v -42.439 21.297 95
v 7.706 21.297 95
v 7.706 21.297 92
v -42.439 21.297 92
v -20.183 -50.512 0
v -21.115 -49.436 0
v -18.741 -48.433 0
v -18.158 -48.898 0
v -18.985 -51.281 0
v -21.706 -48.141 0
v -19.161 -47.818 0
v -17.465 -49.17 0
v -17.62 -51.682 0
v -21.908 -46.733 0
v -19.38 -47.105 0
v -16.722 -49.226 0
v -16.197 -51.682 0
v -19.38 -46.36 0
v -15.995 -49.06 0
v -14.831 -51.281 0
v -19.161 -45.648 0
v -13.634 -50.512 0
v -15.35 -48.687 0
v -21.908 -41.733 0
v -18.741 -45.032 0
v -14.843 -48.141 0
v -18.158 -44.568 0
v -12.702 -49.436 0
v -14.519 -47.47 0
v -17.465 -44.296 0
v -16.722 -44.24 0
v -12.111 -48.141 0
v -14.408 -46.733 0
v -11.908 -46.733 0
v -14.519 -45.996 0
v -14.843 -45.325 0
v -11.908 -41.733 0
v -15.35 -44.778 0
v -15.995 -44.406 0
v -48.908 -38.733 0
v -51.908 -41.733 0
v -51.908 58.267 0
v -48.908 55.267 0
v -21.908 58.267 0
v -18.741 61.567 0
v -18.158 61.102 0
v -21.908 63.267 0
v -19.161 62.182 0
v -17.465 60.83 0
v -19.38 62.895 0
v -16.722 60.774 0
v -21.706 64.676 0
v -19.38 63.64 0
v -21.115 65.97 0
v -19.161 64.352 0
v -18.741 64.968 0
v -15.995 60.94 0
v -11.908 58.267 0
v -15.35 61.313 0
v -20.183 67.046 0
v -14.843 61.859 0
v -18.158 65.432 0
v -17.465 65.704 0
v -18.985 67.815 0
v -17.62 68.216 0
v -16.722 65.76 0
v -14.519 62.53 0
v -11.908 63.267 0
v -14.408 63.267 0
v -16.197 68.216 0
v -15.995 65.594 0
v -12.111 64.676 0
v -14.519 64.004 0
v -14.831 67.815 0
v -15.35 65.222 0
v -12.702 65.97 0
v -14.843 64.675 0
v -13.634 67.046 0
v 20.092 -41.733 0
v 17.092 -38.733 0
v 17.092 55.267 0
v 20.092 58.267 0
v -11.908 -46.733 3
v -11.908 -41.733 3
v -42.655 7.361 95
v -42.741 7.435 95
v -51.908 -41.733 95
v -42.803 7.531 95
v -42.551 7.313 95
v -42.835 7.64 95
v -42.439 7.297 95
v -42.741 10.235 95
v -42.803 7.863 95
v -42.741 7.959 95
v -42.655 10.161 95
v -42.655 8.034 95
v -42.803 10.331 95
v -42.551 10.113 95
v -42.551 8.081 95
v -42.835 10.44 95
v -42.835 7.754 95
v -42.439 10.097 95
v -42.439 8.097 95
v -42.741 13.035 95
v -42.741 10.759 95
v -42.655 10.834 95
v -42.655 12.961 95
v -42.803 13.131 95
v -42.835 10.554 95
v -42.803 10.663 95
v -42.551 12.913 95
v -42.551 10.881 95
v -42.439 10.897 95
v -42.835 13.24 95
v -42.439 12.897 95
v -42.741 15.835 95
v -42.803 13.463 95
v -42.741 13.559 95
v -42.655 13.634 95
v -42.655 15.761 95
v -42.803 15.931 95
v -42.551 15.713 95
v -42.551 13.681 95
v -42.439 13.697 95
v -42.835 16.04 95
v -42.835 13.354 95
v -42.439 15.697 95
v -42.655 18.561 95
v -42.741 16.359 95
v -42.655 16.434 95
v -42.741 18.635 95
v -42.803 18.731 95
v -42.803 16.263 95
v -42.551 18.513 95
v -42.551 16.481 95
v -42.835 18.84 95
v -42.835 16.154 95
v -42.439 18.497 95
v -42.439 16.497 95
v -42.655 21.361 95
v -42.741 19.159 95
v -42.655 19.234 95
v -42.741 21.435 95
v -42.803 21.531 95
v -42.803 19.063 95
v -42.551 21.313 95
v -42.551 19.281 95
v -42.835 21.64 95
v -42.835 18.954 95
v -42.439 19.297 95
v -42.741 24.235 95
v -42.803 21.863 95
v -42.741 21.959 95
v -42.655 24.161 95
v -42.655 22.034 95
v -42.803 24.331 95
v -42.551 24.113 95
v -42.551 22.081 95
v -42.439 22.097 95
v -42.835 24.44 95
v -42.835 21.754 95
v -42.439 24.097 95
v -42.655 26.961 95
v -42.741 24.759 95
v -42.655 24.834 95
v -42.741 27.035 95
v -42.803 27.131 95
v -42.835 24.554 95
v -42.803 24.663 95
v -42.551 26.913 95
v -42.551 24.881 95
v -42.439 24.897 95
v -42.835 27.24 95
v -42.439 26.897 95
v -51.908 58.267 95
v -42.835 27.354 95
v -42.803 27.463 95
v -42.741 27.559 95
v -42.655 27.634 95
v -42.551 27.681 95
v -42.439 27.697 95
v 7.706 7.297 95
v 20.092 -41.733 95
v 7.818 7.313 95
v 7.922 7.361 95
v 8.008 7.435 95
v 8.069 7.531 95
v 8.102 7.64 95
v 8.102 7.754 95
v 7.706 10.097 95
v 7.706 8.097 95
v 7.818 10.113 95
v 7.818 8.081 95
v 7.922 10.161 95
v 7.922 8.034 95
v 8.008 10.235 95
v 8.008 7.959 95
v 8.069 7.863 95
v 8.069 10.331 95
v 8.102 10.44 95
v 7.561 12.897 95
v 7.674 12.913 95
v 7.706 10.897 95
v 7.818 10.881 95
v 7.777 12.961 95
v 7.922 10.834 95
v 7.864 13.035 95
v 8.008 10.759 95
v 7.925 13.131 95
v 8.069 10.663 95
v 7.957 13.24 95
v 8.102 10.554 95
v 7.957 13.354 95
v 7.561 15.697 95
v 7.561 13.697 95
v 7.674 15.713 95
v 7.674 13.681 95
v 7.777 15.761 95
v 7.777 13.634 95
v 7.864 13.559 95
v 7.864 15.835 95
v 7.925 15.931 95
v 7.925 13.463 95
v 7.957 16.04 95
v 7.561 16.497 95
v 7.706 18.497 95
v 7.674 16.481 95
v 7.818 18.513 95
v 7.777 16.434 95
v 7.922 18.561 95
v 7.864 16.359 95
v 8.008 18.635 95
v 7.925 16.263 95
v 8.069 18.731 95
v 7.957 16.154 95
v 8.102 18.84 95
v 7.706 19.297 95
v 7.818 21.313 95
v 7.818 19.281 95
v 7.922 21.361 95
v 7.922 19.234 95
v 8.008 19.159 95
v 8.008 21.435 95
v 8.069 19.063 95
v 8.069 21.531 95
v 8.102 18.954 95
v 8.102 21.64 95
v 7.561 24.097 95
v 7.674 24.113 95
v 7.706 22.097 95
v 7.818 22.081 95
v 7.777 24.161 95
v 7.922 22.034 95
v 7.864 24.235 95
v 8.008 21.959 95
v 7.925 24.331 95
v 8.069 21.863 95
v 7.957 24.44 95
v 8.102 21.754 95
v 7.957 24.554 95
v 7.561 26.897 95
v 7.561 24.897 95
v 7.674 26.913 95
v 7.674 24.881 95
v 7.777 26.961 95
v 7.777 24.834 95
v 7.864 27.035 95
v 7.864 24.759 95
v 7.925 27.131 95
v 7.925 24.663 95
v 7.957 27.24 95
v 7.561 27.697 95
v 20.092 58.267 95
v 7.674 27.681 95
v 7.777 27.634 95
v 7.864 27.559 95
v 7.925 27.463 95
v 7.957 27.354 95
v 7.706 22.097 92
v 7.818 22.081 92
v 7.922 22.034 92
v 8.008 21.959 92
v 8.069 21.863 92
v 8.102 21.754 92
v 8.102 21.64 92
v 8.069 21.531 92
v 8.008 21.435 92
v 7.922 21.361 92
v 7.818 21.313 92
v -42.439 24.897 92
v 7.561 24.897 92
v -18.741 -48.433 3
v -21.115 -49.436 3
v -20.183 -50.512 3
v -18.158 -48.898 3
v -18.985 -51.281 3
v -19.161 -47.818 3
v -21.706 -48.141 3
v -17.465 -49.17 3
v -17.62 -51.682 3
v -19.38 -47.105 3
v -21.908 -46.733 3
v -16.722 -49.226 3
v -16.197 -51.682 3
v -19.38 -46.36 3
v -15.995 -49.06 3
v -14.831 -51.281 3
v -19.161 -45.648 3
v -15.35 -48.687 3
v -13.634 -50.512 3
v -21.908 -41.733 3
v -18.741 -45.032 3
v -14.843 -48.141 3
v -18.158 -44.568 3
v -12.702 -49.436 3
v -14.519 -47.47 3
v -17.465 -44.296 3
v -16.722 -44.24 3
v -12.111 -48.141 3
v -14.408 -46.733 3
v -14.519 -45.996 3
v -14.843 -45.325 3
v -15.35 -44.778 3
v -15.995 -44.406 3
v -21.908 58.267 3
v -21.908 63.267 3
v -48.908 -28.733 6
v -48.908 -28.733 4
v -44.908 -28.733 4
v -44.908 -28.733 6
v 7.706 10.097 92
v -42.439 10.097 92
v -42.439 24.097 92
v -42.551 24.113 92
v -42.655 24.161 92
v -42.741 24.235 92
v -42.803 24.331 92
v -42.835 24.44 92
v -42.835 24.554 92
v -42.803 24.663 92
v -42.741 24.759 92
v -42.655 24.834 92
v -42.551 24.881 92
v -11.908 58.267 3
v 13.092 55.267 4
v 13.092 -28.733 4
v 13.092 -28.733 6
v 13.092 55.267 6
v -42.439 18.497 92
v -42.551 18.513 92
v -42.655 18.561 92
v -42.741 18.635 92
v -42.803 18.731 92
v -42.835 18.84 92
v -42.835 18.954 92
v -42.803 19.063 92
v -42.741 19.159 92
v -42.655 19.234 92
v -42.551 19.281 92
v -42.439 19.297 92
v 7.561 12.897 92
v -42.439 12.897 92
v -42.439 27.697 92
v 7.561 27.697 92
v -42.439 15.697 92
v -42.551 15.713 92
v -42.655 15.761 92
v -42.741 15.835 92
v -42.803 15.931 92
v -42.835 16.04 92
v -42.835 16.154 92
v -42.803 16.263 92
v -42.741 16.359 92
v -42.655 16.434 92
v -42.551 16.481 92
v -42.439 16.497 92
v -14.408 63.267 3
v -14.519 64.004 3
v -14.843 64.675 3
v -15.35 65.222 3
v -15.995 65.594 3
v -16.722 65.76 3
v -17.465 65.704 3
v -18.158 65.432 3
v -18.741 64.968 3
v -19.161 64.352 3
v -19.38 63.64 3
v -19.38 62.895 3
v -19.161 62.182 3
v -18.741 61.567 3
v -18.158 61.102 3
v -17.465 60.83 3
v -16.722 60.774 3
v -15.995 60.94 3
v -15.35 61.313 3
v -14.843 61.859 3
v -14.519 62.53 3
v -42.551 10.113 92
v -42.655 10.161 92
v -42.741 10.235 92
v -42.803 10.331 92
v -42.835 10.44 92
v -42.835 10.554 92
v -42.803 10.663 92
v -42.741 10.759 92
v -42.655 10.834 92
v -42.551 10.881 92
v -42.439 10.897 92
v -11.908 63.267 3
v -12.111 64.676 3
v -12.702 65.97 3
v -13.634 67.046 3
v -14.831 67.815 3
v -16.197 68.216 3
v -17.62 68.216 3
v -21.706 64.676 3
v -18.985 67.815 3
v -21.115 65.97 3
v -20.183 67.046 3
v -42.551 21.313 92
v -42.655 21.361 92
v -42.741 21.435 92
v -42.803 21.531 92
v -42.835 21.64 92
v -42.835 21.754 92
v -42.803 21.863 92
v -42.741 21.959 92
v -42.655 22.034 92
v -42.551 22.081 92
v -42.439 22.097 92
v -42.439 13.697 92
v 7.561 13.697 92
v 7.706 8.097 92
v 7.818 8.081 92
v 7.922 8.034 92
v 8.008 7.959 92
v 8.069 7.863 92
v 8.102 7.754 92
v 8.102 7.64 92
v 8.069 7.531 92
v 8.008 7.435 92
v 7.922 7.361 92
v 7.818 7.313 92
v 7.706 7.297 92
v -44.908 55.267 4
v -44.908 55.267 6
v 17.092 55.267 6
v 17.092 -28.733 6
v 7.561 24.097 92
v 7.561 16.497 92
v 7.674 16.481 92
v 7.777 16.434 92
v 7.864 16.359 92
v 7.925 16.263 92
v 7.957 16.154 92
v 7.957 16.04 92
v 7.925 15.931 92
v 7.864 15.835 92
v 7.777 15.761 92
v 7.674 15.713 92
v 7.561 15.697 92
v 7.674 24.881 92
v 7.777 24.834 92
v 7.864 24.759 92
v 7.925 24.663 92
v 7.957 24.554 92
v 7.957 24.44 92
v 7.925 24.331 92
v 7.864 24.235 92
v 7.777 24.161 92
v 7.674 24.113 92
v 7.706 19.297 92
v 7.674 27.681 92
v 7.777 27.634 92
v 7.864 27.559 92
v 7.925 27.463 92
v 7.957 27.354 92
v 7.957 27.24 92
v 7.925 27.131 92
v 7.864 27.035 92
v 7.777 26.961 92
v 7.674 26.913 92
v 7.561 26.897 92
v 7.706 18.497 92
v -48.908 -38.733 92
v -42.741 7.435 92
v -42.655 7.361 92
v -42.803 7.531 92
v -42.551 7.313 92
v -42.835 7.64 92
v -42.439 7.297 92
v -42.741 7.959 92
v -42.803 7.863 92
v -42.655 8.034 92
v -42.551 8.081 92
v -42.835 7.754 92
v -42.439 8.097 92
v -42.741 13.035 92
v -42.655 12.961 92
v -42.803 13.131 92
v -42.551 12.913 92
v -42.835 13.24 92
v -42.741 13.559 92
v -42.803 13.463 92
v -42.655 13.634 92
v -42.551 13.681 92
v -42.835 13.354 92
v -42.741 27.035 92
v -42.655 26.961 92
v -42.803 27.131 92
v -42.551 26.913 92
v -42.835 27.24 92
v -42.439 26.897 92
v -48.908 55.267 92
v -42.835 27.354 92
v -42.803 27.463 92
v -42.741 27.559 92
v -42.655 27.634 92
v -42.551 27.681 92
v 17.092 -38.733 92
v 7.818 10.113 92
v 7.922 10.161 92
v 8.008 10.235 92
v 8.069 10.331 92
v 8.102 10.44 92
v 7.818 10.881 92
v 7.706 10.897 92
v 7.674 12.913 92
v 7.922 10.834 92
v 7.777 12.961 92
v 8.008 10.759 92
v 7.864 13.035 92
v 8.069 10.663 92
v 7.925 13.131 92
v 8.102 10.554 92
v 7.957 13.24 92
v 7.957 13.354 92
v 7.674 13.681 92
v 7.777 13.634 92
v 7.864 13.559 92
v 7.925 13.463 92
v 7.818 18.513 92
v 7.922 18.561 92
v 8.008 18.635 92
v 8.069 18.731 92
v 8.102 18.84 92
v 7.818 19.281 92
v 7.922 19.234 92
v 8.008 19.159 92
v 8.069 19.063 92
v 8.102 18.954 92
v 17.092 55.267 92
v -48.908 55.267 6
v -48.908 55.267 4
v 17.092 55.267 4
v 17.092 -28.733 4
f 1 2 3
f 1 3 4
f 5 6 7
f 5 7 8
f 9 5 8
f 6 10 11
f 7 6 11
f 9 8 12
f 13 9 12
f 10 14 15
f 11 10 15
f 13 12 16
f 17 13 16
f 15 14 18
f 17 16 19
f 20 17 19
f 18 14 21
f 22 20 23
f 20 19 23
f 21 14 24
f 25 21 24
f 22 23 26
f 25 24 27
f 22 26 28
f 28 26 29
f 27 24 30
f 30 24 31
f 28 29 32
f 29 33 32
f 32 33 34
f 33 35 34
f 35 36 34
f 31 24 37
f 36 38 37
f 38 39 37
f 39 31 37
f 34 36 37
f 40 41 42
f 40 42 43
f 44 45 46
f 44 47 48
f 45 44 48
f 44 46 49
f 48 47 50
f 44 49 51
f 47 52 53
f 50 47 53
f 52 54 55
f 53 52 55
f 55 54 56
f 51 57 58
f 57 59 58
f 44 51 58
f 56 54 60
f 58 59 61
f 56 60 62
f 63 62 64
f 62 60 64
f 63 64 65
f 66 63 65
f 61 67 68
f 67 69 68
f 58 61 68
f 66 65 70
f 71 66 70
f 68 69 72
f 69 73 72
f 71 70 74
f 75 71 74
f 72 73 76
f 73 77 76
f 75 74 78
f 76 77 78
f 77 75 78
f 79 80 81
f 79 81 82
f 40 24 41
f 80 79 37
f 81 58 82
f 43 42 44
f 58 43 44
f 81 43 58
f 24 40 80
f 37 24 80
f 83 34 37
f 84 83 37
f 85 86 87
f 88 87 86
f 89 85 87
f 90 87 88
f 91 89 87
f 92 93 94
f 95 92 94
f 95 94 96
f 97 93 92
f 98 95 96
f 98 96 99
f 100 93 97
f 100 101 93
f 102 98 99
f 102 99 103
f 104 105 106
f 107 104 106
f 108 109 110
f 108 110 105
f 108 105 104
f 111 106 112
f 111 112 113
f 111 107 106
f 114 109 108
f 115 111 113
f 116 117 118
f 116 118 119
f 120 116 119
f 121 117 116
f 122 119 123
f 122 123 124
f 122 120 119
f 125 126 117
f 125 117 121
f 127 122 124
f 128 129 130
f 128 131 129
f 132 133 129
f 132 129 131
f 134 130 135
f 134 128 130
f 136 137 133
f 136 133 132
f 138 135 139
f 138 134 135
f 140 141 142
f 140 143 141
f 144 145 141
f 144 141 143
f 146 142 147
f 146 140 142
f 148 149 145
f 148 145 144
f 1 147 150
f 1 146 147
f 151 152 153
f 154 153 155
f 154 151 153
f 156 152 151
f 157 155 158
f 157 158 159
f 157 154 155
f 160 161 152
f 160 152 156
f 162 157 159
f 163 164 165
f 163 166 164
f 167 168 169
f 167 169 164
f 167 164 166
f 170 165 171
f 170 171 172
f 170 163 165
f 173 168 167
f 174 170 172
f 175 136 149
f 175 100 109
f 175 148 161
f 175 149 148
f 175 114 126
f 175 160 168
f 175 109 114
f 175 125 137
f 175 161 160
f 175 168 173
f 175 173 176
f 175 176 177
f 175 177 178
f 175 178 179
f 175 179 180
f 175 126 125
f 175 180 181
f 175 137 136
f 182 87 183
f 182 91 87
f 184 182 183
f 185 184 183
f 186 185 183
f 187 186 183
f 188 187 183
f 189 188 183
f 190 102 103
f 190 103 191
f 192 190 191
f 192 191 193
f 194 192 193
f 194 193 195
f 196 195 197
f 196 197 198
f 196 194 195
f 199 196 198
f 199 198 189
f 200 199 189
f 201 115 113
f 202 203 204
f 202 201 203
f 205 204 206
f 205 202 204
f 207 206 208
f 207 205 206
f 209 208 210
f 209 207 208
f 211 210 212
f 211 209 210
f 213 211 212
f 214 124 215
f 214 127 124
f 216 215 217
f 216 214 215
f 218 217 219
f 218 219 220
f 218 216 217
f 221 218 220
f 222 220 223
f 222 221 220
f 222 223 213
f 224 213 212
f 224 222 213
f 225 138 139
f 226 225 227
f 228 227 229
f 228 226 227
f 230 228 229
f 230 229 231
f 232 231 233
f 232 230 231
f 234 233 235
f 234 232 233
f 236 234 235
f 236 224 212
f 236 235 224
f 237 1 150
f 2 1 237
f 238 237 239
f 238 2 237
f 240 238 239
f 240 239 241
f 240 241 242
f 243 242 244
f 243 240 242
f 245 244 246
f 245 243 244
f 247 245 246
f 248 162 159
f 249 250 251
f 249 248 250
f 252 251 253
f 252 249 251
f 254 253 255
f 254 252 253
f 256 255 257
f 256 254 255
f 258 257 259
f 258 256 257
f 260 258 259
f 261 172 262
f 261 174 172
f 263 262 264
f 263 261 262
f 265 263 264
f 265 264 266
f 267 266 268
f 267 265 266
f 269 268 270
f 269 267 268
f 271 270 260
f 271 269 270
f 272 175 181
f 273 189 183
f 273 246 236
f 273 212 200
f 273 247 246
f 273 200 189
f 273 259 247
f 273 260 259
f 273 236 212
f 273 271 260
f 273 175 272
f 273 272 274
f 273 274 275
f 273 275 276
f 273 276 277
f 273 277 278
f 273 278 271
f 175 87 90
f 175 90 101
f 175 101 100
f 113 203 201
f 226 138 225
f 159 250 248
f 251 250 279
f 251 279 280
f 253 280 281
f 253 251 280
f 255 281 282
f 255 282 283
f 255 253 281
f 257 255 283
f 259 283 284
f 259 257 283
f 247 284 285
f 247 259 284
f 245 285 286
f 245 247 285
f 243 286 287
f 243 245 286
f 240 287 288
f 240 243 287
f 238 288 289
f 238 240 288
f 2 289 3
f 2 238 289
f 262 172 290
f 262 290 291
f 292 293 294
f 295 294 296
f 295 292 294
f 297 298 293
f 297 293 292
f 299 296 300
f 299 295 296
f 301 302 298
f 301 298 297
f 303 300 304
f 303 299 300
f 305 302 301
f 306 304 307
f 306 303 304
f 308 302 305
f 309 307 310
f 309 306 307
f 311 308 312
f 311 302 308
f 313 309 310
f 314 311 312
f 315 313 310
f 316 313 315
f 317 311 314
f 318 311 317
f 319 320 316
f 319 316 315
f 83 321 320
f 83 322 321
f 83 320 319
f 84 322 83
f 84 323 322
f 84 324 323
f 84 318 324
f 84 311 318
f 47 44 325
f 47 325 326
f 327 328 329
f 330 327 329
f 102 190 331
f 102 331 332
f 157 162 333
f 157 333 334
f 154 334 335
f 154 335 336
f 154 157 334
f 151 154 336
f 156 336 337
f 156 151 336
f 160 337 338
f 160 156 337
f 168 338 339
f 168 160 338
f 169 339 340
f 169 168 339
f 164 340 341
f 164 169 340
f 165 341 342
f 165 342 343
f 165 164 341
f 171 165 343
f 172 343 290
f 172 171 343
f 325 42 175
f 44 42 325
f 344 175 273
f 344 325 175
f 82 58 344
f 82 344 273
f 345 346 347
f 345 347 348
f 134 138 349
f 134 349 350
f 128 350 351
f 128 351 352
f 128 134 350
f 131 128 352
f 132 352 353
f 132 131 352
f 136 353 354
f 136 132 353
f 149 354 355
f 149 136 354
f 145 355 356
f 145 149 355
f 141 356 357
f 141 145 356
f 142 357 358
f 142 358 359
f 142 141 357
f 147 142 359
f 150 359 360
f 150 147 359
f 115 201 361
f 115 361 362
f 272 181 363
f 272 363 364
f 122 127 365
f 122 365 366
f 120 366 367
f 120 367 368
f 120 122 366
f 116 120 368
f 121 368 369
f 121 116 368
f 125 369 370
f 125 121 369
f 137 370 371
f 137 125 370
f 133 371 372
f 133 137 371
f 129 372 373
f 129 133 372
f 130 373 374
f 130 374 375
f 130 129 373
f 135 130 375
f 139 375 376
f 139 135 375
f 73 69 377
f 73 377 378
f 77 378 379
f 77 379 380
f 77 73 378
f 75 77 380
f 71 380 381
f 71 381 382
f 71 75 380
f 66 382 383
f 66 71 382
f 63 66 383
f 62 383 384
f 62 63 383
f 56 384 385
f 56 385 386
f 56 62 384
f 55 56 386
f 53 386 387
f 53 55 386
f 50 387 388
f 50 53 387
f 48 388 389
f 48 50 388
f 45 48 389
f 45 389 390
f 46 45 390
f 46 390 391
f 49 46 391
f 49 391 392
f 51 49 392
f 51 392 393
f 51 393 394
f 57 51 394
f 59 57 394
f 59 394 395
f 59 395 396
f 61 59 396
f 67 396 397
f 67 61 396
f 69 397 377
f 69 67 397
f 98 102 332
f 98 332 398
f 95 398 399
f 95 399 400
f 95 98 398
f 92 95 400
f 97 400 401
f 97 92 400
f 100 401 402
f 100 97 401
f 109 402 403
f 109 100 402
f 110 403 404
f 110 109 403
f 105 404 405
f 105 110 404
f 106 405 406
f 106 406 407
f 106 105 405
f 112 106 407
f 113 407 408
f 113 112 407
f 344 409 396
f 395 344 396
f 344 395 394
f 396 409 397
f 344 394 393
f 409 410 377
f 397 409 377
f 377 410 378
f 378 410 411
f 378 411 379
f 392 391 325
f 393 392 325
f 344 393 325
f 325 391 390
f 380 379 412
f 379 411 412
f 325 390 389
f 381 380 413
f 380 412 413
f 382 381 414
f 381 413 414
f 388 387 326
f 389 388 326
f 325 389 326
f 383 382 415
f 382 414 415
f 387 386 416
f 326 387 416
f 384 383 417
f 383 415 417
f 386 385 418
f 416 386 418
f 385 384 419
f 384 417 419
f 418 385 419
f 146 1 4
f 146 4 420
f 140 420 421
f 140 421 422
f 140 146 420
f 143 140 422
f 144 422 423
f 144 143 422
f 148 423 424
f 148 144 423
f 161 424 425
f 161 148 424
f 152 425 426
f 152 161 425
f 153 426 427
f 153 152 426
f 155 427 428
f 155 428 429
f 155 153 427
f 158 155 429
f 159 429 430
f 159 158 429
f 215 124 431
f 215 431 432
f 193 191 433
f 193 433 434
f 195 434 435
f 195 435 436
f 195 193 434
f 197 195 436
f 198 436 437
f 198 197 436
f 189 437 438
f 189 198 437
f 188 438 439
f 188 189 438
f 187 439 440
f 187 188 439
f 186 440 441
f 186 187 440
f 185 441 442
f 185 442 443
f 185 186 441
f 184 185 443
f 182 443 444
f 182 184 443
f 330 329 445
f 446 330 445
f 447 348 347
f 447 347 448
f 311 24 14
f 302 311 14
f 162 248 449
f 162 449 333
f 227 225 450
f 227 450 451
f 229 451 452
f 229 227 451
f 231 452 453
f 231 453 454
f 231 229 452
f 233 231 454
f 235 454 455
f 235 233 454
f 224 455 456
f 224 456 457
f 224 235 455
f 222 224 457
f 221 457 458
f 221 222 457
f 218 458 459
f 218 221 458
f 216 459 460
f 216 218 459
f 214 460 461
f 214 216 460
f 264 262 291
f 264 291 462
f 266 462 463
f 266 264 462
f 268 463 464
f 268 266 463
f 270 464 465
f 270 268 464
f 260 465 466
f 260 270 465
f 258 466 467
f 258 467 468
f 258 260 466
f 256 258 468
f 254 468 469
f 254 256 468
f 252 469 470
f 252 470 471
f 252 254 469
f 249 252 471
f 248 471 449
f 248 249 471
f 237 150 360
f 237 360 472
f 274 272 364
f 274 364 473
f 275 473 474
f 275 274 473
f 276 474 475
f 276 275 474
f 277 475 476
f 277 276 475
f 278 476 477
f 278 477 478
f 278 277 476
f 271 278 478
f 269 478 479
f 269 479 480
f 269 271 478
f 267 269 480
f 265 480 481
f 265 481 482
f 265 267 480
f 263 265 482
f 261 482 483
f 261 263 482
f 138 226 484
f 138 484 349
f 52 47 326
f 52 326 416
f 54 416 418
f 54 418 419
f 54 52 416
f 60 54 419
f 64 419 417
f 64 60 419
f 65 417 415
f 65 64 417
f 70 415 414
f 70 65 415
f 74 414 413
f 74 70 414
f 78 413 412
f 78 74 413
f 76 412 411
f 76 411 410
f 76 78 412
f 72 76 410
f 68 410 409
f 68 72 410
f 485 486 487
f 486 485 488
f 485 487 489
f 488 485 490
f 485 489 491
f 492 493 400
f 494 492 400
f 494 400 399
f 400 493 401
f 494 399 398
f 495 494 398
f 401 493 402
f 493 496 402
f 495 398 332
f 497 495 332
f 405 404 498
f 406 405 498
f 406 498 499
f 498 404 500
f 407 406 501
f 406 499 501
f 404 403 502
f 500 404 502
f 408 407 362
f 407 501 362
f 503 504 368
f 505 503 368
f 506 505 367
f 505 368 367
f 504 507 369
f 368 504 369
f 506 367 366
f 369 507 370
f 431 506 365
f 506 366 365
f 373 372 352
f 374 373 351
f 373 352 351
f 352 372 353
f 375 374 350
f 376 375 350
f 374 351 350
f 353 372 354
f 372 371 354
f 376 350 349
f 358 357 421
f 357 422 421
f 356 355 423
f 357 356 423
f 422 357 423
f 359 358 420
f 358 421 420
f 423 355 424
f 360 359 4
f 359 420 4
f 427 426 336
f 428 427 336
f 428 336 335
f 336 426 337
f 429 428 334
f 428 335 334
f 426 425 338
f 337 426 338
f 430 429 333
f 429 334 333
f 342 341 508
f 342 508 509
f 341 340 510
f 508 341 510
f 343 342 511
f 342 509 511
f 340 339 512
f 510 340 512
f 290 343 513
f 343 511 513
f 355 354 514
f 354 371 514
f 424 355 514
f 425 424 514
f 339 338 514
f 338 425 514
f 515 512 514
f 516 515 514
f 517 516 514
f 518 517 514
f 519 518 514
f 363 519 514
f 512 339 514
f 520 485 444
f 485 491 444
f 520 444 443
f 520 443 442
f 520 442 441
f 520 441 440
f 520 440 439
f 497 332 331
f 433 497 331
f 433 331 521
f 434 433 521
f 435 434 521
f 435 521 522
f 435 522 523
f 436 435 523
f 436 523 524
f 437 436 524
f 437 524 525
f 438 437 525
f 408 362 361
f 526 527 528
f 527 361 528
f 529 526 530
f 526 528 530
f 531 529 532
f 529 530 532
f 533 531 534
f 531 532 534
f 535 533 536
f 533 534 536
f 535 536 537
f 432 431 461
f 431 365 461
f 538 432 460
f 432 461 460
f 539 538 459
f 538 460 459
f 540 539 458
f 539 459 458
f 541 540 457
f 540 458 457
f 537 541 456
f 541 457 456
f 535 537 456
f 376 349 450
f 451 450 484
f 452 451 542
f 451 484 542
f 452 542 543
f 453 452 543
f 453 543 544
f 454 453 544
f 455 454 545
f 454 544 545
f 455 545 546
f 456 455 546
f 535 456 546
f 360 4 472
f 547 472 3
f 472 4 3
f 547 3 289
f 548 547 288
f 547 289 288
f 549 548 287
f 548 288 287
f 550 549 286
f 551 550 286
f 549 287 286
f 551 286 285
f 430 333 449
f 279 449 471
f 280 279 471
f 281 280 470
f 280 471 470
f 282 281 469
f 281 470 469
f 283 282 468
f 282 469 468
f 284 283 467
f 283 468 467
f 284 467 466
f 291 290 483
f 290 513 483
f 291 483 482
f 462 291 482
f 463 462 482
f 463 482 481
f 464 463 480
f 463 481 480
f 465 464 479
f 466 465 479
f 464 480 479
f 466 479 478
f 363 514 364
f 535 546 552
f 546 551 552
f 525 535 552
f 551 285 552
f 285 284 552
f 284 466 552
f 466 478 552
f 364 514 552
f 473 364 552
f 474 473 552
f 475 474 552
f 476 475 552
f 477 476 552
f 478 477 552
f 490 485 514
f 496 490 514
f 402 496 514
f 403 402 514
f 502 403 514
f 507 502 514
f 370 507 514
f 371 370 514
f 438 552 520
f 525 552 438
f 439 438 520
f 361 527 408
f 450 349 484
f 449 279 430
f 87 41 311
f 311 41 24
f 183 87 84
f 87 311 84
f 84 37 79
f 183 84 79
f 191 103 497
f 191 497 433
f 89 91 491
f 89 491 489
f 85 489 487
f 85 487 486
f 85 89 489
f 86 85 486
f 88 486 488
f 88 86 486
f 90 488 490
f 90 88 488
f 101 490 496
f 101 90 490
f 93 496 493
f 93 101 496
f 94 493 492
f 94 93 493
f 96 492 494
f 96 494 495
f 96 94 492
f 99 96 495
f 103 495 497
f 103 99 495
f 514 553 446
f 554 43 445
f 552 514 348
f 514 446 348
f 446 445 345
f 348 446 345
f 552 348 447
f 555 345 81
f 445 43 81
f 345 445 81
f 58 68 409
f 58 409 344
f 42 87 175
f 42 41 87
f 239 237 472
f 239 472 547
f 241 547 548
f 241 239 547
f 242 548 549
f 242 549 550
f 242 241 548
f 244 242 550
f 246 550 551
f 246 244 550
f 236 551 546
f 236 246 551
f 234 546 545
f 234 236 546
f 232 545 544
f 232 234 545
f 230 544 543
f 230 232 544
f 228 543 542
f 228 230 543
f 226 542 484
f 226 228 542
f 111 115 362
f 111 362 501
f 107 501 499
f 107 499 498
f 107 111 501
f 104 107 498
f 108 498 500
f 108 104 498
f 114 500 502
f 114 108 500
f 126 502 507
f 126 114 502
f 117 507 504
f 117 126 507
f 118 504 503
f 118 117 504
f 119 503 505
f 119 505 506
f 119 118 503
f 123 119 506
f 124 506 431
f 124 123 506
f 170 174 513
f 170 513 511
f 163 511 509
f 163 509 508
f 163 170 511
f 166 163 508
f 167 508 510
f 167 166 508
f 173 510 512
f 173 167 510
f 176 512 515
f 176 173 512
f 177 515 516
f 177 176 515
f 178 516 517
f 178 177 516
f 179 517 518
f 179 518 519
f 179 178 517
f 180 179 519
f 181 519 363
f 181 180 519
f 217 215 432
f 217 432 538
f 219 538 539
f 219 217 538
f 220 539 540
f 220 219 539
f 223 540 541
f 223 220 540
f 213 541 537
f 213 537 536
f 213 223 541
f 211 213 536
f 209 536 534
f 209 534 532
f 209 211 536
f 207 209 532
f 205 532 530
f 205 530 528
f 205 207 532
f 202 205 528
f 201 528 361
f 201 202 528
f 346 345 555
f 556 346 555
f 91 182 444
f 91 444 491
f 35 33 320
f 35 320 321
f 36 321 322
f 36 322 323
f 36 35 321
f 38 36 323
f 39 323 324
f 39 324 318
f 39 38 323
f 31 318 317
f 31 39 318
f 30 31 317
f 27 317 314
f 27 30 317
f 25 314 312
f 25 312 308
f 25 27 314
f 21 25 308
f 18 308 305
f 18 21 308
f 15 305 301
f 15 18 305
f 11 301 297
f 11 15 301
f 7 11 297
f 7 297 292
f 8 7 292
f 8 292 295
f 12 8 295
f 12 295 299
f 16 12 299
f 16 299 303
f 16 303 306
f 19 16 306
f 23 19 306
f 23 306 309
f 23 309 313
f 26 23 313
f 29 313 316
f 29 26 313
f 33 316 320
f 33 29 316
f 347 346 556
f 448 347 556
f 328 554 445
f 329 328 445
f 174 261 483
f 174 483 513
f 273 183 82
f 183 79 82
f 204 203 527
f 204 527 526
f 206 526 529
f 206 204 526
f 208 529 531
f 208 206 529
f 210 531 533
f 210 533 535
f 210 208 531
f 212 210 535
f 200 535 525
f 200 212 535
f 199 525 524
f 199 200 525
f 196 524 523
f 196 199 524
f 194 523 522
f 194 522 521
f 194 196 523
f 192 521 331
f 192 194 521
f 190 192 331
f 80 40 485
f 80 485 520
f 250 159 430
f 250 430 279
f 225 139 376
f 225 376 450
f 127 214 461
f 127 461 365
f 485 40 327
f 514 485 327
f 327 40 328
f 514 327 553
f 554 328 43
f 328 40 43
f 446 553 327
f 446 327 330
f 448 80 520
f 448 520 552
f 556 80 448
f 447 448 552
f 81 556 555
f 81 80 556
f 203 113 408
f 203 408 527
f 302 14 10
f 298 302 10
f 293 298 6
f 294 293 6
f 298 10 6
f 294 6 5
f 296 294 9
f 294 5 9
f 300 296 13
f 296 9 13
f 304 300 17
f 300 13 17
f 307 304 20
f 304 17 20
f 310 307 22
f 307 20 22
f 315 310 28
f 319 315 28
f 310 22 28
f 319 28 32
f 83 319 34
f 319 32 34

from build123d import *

# Parameters (mm, degrees)
ESBO_O1_W                = 72
ESBO_O1_H                = 100
ESBO_O1_W_2              = 66
ESBO_O1_H_2              = 94
RESSALTO_EXTRUS_O1_DEPTH = 92
ESBO_O2_W                = 72
ESBO_O2_H                = 100
RESSALTO_EXTRUS_O2_DEPTH = 3
RESSALTO_EXTRUS_O3_START = -95
ESBO_O3_R                = 2.5
RESSALTO_EXTRUS_O3_DEPTH = 3
CORTE_EXTRUS_O1_DEPTH    = 3
RESSALTO_EXTRUS_O4_START = 4
ESBO_O5_W                = 4
ESBO_O5_H                = 84
RESSALTO_EXTRUS_O4_DEPTH = 2


with BuildPart() as part:
    # Esboço1 → Ressalto-extrusão1 (new body)
    with BuildSketch(Plane.XY):
        with Locations((-15.908396947, 8.267175573)):
            Rectangle(ESBO_O1_W, ESBO_O1_H)
        with Locations((-15.908396947, 8.267175573)):
            Rectangle(ESBO_O1_W_2, ESBO_O1_H_2, mode=Mode.SUBTRACT)
    extrude(amount=RESSALTO_EXTRUS_O1_DEPTH)

    # Esboço2 → Ressalto-extrusão2 (add)
    with BuildSketch(Plane.XY.offset(92)):
        with Locations((-15.908396947, 8.267175573)):
            Rectangle(ESBO_O2_W, ESBO_O2_H)
    extrude(amount=RESSALTO_EXTRUS_O2_DEPTH)

    # Esboço3 → Ressalto-extrusão3 (add)
    # profile 1 of 2: a face of its own
    with BuildSketch(Plane.XY.offset(95).offset(RESSALTO_EXTRUS_O3_START)):
        with BuildLine():
            Line((-21.908396947, 58.267175573), (-21.908396947, 63.267175573))
            ThreePointArc((-21.908396947, 63.267175573), (-16.908396947, 68.267175573), (-11.908396947, 63.267175573))
            Line((-11.908396947, 63.267175573), (-11.908396947, 58.267175573))
            Line((-11.908396947, 58.267175573), (-21.908396947, 58.267175573))
        make_face()
        with Locations((-16.908396947, 63.267175573)):
            Circle(ESBO_O3_R, mode=Mode.SUBTRACT)
    # profile 2 of 2: a face of its own
    with BuildSketch(Plane.XY.offset(95).offset(RESSALTO_EXTRUS_O3_START)):
        with BuildLine():
            Line((-11.908396947, -46.732824427), (-11.908396947, -41.732824427))
            Line((-11.908396947, -41.732824427), (-21.908396947, -41.732824427))
            Line((-21.908396947, -41.732824427), (-21.908396947, -46.732824427))
            ThreePointArc((-21.908396947, -46.732824427), (-16.908396947, -51.732824427), (-11.908396947, -46.732824427))
        make_face()
        with Locations((-16.908396947, -46.732824427)):
            Circle(ESBO_O3_R, mode=Mode.SUBTRACT)
    extrude(amount=RESSALTO_EXTRUS_O3_DEPTH)

    # Esboço4 → Corte-extrusão1 (cut)
    with BuildSketch(Plane.XY.offset(95)):
        with BuildLine():
            Line((-42.438758468, 27.697077942), (7.561241532, 27.697077942))
            ThreePointArc((7.561241532, 27.697077942), (7.961241532, 27.297077942), (7.561241532, 26.897077942))
            Line((7.561241532, 26.897077942), (-42.438758468, 26.897077942))
            ThreePointArc((-42.438758468, 26.897077942), (-42.838758468, 27.297077942), (-42.438758468, 27.697077942))
        make_face()
        with BuildLine():
            Line((-42.438758468, 24.897077942), (7.561241532, 24.897077942))
            ThreePointArc((7.561241532, 24.897077942), (7.961241532, 24.497077942), (7.561241532, 24.097077942))
            Line((7.561241532, 24.097077942), (-42.438758468, 24.097077942))
            ThreePointArc((-42.438758468, 24.097077942), (-42.838758468, 24.497077942), (-42.438758468, 24.897077942))
        make_face()
        with BuildLine():
            Line((-42.438758468, 22.097077942), (7.705579096, 22.097077942))
            ThreePointArc((7.705579096, 22.097077942), (8.105579096, 21.697077942), (7.705579096, 21.297077942))
            Line((7.705579096, 21.297077942), (-42.438758468, 21.297077942))
            ThreePointArc((-42.438758468, 21.297077942), (-42.838758468, 21.697077942), (-42.438758468, 22.097077942))
        make_face()
        with BuildLine():
            Line((-42.438758468, 19.297077942), (7.705579096, 19.297077942))
            ThreePointArc((7.705579096, 19.297077942), (8.105579096, 18.897077942), (7.705579096, 18.497077942))
            Line((7.705579096, 18.497077942), (-42.438758468, 18.497077942))
            ThreePointArc((-42.438758468, 18.497077942), (-42.838758468, 18.897077942), (-42.438758468, 19.297077942))
        make_face()
        with BuildLine():
            Line((-42.438758468, 16.497077942), (7.561241532, 16.497077942))
            ThreePointArc((7.561241532, 16.497077942), (7.961241532, 16.097077942), (7.561241532, 15.697077942))
            Line((7.561241532, 15.697077942), (-42.438758468, 15.697077942))
            ThreePointArc((-42.438758468, 15.697077942), (-42.838758468, 16.097077942), (-42.438758468, 16.497077942))
        make_face()
        with BuildLine():
            Line((-42.438758468, 13.697077942), (7.561241532, 13.697077942))
            ThreePointArc((7.561241532, 13.697077942), (7.961241532, 13.297077942), (7.561241532, 12.897077942))
            Line((7.561241532, 12.897077942), (-42.438758468, 12.897077942))
            ThreePointArc((-42.438758468, 12.897077942), (-42.838758468, 13.297077942), (-42.438758468, 13.697077942))
        make_face()
        with BuildLine():
            Line((-42.438758468, 10.897077942), (7.705579175, 10.897077942))
            ThreePointArc((7.705579175, 10.897077942), (8.105579175, 10.497077942), (7.705579175, 10.097077942))
            Line((7.705579175, 10.097077942), (-42.438758468, 10.097077942))
            ThreePointArc((-42.438758468, 10.097077942), (-42.838758468, 10.497077942), (-42.438758468, 10.897077942))
        make_face()
        with BuildLine():
            Line((-42.438758468, 8.097077942), (7.705579175, 8.097077942))
            ThreePointArc((7.705579175, 8.097077942), (8.105579175, 7.697077942), (7.705579175, 7.297077942))
            Line((7.705579175, 7.297077942), (-42.438758468, 7.297077942))
            ThreePointArc((-42.438758468, 7.297077942), (-42.838758468, 7.697077942), (-42.438758468, 8.097077942))
        make_face()
    extrude(amount=-CORTE_EXTRUS_O1_DEPTH, mode=Mode.SUBTRACT)

    # Esboço5 → Ressalto-extrusão4 (add)
    with BuildSketch(Plane.XY.offset(RESSALTO_EXTRUS_O4_START)):
        with Locations((-46.908396947, 13.267175573)):
            Rectangle(ESBO_O5_W, ESBO_O5_H)
        with Locations((15.091603053, 13.267175573)):
            Rectangle(ESBO_O5_W, ESBO_O5_H)
    extrude(amount=RESSALTO_EXTRUS_O4_DEPTH)


solid = part.part
